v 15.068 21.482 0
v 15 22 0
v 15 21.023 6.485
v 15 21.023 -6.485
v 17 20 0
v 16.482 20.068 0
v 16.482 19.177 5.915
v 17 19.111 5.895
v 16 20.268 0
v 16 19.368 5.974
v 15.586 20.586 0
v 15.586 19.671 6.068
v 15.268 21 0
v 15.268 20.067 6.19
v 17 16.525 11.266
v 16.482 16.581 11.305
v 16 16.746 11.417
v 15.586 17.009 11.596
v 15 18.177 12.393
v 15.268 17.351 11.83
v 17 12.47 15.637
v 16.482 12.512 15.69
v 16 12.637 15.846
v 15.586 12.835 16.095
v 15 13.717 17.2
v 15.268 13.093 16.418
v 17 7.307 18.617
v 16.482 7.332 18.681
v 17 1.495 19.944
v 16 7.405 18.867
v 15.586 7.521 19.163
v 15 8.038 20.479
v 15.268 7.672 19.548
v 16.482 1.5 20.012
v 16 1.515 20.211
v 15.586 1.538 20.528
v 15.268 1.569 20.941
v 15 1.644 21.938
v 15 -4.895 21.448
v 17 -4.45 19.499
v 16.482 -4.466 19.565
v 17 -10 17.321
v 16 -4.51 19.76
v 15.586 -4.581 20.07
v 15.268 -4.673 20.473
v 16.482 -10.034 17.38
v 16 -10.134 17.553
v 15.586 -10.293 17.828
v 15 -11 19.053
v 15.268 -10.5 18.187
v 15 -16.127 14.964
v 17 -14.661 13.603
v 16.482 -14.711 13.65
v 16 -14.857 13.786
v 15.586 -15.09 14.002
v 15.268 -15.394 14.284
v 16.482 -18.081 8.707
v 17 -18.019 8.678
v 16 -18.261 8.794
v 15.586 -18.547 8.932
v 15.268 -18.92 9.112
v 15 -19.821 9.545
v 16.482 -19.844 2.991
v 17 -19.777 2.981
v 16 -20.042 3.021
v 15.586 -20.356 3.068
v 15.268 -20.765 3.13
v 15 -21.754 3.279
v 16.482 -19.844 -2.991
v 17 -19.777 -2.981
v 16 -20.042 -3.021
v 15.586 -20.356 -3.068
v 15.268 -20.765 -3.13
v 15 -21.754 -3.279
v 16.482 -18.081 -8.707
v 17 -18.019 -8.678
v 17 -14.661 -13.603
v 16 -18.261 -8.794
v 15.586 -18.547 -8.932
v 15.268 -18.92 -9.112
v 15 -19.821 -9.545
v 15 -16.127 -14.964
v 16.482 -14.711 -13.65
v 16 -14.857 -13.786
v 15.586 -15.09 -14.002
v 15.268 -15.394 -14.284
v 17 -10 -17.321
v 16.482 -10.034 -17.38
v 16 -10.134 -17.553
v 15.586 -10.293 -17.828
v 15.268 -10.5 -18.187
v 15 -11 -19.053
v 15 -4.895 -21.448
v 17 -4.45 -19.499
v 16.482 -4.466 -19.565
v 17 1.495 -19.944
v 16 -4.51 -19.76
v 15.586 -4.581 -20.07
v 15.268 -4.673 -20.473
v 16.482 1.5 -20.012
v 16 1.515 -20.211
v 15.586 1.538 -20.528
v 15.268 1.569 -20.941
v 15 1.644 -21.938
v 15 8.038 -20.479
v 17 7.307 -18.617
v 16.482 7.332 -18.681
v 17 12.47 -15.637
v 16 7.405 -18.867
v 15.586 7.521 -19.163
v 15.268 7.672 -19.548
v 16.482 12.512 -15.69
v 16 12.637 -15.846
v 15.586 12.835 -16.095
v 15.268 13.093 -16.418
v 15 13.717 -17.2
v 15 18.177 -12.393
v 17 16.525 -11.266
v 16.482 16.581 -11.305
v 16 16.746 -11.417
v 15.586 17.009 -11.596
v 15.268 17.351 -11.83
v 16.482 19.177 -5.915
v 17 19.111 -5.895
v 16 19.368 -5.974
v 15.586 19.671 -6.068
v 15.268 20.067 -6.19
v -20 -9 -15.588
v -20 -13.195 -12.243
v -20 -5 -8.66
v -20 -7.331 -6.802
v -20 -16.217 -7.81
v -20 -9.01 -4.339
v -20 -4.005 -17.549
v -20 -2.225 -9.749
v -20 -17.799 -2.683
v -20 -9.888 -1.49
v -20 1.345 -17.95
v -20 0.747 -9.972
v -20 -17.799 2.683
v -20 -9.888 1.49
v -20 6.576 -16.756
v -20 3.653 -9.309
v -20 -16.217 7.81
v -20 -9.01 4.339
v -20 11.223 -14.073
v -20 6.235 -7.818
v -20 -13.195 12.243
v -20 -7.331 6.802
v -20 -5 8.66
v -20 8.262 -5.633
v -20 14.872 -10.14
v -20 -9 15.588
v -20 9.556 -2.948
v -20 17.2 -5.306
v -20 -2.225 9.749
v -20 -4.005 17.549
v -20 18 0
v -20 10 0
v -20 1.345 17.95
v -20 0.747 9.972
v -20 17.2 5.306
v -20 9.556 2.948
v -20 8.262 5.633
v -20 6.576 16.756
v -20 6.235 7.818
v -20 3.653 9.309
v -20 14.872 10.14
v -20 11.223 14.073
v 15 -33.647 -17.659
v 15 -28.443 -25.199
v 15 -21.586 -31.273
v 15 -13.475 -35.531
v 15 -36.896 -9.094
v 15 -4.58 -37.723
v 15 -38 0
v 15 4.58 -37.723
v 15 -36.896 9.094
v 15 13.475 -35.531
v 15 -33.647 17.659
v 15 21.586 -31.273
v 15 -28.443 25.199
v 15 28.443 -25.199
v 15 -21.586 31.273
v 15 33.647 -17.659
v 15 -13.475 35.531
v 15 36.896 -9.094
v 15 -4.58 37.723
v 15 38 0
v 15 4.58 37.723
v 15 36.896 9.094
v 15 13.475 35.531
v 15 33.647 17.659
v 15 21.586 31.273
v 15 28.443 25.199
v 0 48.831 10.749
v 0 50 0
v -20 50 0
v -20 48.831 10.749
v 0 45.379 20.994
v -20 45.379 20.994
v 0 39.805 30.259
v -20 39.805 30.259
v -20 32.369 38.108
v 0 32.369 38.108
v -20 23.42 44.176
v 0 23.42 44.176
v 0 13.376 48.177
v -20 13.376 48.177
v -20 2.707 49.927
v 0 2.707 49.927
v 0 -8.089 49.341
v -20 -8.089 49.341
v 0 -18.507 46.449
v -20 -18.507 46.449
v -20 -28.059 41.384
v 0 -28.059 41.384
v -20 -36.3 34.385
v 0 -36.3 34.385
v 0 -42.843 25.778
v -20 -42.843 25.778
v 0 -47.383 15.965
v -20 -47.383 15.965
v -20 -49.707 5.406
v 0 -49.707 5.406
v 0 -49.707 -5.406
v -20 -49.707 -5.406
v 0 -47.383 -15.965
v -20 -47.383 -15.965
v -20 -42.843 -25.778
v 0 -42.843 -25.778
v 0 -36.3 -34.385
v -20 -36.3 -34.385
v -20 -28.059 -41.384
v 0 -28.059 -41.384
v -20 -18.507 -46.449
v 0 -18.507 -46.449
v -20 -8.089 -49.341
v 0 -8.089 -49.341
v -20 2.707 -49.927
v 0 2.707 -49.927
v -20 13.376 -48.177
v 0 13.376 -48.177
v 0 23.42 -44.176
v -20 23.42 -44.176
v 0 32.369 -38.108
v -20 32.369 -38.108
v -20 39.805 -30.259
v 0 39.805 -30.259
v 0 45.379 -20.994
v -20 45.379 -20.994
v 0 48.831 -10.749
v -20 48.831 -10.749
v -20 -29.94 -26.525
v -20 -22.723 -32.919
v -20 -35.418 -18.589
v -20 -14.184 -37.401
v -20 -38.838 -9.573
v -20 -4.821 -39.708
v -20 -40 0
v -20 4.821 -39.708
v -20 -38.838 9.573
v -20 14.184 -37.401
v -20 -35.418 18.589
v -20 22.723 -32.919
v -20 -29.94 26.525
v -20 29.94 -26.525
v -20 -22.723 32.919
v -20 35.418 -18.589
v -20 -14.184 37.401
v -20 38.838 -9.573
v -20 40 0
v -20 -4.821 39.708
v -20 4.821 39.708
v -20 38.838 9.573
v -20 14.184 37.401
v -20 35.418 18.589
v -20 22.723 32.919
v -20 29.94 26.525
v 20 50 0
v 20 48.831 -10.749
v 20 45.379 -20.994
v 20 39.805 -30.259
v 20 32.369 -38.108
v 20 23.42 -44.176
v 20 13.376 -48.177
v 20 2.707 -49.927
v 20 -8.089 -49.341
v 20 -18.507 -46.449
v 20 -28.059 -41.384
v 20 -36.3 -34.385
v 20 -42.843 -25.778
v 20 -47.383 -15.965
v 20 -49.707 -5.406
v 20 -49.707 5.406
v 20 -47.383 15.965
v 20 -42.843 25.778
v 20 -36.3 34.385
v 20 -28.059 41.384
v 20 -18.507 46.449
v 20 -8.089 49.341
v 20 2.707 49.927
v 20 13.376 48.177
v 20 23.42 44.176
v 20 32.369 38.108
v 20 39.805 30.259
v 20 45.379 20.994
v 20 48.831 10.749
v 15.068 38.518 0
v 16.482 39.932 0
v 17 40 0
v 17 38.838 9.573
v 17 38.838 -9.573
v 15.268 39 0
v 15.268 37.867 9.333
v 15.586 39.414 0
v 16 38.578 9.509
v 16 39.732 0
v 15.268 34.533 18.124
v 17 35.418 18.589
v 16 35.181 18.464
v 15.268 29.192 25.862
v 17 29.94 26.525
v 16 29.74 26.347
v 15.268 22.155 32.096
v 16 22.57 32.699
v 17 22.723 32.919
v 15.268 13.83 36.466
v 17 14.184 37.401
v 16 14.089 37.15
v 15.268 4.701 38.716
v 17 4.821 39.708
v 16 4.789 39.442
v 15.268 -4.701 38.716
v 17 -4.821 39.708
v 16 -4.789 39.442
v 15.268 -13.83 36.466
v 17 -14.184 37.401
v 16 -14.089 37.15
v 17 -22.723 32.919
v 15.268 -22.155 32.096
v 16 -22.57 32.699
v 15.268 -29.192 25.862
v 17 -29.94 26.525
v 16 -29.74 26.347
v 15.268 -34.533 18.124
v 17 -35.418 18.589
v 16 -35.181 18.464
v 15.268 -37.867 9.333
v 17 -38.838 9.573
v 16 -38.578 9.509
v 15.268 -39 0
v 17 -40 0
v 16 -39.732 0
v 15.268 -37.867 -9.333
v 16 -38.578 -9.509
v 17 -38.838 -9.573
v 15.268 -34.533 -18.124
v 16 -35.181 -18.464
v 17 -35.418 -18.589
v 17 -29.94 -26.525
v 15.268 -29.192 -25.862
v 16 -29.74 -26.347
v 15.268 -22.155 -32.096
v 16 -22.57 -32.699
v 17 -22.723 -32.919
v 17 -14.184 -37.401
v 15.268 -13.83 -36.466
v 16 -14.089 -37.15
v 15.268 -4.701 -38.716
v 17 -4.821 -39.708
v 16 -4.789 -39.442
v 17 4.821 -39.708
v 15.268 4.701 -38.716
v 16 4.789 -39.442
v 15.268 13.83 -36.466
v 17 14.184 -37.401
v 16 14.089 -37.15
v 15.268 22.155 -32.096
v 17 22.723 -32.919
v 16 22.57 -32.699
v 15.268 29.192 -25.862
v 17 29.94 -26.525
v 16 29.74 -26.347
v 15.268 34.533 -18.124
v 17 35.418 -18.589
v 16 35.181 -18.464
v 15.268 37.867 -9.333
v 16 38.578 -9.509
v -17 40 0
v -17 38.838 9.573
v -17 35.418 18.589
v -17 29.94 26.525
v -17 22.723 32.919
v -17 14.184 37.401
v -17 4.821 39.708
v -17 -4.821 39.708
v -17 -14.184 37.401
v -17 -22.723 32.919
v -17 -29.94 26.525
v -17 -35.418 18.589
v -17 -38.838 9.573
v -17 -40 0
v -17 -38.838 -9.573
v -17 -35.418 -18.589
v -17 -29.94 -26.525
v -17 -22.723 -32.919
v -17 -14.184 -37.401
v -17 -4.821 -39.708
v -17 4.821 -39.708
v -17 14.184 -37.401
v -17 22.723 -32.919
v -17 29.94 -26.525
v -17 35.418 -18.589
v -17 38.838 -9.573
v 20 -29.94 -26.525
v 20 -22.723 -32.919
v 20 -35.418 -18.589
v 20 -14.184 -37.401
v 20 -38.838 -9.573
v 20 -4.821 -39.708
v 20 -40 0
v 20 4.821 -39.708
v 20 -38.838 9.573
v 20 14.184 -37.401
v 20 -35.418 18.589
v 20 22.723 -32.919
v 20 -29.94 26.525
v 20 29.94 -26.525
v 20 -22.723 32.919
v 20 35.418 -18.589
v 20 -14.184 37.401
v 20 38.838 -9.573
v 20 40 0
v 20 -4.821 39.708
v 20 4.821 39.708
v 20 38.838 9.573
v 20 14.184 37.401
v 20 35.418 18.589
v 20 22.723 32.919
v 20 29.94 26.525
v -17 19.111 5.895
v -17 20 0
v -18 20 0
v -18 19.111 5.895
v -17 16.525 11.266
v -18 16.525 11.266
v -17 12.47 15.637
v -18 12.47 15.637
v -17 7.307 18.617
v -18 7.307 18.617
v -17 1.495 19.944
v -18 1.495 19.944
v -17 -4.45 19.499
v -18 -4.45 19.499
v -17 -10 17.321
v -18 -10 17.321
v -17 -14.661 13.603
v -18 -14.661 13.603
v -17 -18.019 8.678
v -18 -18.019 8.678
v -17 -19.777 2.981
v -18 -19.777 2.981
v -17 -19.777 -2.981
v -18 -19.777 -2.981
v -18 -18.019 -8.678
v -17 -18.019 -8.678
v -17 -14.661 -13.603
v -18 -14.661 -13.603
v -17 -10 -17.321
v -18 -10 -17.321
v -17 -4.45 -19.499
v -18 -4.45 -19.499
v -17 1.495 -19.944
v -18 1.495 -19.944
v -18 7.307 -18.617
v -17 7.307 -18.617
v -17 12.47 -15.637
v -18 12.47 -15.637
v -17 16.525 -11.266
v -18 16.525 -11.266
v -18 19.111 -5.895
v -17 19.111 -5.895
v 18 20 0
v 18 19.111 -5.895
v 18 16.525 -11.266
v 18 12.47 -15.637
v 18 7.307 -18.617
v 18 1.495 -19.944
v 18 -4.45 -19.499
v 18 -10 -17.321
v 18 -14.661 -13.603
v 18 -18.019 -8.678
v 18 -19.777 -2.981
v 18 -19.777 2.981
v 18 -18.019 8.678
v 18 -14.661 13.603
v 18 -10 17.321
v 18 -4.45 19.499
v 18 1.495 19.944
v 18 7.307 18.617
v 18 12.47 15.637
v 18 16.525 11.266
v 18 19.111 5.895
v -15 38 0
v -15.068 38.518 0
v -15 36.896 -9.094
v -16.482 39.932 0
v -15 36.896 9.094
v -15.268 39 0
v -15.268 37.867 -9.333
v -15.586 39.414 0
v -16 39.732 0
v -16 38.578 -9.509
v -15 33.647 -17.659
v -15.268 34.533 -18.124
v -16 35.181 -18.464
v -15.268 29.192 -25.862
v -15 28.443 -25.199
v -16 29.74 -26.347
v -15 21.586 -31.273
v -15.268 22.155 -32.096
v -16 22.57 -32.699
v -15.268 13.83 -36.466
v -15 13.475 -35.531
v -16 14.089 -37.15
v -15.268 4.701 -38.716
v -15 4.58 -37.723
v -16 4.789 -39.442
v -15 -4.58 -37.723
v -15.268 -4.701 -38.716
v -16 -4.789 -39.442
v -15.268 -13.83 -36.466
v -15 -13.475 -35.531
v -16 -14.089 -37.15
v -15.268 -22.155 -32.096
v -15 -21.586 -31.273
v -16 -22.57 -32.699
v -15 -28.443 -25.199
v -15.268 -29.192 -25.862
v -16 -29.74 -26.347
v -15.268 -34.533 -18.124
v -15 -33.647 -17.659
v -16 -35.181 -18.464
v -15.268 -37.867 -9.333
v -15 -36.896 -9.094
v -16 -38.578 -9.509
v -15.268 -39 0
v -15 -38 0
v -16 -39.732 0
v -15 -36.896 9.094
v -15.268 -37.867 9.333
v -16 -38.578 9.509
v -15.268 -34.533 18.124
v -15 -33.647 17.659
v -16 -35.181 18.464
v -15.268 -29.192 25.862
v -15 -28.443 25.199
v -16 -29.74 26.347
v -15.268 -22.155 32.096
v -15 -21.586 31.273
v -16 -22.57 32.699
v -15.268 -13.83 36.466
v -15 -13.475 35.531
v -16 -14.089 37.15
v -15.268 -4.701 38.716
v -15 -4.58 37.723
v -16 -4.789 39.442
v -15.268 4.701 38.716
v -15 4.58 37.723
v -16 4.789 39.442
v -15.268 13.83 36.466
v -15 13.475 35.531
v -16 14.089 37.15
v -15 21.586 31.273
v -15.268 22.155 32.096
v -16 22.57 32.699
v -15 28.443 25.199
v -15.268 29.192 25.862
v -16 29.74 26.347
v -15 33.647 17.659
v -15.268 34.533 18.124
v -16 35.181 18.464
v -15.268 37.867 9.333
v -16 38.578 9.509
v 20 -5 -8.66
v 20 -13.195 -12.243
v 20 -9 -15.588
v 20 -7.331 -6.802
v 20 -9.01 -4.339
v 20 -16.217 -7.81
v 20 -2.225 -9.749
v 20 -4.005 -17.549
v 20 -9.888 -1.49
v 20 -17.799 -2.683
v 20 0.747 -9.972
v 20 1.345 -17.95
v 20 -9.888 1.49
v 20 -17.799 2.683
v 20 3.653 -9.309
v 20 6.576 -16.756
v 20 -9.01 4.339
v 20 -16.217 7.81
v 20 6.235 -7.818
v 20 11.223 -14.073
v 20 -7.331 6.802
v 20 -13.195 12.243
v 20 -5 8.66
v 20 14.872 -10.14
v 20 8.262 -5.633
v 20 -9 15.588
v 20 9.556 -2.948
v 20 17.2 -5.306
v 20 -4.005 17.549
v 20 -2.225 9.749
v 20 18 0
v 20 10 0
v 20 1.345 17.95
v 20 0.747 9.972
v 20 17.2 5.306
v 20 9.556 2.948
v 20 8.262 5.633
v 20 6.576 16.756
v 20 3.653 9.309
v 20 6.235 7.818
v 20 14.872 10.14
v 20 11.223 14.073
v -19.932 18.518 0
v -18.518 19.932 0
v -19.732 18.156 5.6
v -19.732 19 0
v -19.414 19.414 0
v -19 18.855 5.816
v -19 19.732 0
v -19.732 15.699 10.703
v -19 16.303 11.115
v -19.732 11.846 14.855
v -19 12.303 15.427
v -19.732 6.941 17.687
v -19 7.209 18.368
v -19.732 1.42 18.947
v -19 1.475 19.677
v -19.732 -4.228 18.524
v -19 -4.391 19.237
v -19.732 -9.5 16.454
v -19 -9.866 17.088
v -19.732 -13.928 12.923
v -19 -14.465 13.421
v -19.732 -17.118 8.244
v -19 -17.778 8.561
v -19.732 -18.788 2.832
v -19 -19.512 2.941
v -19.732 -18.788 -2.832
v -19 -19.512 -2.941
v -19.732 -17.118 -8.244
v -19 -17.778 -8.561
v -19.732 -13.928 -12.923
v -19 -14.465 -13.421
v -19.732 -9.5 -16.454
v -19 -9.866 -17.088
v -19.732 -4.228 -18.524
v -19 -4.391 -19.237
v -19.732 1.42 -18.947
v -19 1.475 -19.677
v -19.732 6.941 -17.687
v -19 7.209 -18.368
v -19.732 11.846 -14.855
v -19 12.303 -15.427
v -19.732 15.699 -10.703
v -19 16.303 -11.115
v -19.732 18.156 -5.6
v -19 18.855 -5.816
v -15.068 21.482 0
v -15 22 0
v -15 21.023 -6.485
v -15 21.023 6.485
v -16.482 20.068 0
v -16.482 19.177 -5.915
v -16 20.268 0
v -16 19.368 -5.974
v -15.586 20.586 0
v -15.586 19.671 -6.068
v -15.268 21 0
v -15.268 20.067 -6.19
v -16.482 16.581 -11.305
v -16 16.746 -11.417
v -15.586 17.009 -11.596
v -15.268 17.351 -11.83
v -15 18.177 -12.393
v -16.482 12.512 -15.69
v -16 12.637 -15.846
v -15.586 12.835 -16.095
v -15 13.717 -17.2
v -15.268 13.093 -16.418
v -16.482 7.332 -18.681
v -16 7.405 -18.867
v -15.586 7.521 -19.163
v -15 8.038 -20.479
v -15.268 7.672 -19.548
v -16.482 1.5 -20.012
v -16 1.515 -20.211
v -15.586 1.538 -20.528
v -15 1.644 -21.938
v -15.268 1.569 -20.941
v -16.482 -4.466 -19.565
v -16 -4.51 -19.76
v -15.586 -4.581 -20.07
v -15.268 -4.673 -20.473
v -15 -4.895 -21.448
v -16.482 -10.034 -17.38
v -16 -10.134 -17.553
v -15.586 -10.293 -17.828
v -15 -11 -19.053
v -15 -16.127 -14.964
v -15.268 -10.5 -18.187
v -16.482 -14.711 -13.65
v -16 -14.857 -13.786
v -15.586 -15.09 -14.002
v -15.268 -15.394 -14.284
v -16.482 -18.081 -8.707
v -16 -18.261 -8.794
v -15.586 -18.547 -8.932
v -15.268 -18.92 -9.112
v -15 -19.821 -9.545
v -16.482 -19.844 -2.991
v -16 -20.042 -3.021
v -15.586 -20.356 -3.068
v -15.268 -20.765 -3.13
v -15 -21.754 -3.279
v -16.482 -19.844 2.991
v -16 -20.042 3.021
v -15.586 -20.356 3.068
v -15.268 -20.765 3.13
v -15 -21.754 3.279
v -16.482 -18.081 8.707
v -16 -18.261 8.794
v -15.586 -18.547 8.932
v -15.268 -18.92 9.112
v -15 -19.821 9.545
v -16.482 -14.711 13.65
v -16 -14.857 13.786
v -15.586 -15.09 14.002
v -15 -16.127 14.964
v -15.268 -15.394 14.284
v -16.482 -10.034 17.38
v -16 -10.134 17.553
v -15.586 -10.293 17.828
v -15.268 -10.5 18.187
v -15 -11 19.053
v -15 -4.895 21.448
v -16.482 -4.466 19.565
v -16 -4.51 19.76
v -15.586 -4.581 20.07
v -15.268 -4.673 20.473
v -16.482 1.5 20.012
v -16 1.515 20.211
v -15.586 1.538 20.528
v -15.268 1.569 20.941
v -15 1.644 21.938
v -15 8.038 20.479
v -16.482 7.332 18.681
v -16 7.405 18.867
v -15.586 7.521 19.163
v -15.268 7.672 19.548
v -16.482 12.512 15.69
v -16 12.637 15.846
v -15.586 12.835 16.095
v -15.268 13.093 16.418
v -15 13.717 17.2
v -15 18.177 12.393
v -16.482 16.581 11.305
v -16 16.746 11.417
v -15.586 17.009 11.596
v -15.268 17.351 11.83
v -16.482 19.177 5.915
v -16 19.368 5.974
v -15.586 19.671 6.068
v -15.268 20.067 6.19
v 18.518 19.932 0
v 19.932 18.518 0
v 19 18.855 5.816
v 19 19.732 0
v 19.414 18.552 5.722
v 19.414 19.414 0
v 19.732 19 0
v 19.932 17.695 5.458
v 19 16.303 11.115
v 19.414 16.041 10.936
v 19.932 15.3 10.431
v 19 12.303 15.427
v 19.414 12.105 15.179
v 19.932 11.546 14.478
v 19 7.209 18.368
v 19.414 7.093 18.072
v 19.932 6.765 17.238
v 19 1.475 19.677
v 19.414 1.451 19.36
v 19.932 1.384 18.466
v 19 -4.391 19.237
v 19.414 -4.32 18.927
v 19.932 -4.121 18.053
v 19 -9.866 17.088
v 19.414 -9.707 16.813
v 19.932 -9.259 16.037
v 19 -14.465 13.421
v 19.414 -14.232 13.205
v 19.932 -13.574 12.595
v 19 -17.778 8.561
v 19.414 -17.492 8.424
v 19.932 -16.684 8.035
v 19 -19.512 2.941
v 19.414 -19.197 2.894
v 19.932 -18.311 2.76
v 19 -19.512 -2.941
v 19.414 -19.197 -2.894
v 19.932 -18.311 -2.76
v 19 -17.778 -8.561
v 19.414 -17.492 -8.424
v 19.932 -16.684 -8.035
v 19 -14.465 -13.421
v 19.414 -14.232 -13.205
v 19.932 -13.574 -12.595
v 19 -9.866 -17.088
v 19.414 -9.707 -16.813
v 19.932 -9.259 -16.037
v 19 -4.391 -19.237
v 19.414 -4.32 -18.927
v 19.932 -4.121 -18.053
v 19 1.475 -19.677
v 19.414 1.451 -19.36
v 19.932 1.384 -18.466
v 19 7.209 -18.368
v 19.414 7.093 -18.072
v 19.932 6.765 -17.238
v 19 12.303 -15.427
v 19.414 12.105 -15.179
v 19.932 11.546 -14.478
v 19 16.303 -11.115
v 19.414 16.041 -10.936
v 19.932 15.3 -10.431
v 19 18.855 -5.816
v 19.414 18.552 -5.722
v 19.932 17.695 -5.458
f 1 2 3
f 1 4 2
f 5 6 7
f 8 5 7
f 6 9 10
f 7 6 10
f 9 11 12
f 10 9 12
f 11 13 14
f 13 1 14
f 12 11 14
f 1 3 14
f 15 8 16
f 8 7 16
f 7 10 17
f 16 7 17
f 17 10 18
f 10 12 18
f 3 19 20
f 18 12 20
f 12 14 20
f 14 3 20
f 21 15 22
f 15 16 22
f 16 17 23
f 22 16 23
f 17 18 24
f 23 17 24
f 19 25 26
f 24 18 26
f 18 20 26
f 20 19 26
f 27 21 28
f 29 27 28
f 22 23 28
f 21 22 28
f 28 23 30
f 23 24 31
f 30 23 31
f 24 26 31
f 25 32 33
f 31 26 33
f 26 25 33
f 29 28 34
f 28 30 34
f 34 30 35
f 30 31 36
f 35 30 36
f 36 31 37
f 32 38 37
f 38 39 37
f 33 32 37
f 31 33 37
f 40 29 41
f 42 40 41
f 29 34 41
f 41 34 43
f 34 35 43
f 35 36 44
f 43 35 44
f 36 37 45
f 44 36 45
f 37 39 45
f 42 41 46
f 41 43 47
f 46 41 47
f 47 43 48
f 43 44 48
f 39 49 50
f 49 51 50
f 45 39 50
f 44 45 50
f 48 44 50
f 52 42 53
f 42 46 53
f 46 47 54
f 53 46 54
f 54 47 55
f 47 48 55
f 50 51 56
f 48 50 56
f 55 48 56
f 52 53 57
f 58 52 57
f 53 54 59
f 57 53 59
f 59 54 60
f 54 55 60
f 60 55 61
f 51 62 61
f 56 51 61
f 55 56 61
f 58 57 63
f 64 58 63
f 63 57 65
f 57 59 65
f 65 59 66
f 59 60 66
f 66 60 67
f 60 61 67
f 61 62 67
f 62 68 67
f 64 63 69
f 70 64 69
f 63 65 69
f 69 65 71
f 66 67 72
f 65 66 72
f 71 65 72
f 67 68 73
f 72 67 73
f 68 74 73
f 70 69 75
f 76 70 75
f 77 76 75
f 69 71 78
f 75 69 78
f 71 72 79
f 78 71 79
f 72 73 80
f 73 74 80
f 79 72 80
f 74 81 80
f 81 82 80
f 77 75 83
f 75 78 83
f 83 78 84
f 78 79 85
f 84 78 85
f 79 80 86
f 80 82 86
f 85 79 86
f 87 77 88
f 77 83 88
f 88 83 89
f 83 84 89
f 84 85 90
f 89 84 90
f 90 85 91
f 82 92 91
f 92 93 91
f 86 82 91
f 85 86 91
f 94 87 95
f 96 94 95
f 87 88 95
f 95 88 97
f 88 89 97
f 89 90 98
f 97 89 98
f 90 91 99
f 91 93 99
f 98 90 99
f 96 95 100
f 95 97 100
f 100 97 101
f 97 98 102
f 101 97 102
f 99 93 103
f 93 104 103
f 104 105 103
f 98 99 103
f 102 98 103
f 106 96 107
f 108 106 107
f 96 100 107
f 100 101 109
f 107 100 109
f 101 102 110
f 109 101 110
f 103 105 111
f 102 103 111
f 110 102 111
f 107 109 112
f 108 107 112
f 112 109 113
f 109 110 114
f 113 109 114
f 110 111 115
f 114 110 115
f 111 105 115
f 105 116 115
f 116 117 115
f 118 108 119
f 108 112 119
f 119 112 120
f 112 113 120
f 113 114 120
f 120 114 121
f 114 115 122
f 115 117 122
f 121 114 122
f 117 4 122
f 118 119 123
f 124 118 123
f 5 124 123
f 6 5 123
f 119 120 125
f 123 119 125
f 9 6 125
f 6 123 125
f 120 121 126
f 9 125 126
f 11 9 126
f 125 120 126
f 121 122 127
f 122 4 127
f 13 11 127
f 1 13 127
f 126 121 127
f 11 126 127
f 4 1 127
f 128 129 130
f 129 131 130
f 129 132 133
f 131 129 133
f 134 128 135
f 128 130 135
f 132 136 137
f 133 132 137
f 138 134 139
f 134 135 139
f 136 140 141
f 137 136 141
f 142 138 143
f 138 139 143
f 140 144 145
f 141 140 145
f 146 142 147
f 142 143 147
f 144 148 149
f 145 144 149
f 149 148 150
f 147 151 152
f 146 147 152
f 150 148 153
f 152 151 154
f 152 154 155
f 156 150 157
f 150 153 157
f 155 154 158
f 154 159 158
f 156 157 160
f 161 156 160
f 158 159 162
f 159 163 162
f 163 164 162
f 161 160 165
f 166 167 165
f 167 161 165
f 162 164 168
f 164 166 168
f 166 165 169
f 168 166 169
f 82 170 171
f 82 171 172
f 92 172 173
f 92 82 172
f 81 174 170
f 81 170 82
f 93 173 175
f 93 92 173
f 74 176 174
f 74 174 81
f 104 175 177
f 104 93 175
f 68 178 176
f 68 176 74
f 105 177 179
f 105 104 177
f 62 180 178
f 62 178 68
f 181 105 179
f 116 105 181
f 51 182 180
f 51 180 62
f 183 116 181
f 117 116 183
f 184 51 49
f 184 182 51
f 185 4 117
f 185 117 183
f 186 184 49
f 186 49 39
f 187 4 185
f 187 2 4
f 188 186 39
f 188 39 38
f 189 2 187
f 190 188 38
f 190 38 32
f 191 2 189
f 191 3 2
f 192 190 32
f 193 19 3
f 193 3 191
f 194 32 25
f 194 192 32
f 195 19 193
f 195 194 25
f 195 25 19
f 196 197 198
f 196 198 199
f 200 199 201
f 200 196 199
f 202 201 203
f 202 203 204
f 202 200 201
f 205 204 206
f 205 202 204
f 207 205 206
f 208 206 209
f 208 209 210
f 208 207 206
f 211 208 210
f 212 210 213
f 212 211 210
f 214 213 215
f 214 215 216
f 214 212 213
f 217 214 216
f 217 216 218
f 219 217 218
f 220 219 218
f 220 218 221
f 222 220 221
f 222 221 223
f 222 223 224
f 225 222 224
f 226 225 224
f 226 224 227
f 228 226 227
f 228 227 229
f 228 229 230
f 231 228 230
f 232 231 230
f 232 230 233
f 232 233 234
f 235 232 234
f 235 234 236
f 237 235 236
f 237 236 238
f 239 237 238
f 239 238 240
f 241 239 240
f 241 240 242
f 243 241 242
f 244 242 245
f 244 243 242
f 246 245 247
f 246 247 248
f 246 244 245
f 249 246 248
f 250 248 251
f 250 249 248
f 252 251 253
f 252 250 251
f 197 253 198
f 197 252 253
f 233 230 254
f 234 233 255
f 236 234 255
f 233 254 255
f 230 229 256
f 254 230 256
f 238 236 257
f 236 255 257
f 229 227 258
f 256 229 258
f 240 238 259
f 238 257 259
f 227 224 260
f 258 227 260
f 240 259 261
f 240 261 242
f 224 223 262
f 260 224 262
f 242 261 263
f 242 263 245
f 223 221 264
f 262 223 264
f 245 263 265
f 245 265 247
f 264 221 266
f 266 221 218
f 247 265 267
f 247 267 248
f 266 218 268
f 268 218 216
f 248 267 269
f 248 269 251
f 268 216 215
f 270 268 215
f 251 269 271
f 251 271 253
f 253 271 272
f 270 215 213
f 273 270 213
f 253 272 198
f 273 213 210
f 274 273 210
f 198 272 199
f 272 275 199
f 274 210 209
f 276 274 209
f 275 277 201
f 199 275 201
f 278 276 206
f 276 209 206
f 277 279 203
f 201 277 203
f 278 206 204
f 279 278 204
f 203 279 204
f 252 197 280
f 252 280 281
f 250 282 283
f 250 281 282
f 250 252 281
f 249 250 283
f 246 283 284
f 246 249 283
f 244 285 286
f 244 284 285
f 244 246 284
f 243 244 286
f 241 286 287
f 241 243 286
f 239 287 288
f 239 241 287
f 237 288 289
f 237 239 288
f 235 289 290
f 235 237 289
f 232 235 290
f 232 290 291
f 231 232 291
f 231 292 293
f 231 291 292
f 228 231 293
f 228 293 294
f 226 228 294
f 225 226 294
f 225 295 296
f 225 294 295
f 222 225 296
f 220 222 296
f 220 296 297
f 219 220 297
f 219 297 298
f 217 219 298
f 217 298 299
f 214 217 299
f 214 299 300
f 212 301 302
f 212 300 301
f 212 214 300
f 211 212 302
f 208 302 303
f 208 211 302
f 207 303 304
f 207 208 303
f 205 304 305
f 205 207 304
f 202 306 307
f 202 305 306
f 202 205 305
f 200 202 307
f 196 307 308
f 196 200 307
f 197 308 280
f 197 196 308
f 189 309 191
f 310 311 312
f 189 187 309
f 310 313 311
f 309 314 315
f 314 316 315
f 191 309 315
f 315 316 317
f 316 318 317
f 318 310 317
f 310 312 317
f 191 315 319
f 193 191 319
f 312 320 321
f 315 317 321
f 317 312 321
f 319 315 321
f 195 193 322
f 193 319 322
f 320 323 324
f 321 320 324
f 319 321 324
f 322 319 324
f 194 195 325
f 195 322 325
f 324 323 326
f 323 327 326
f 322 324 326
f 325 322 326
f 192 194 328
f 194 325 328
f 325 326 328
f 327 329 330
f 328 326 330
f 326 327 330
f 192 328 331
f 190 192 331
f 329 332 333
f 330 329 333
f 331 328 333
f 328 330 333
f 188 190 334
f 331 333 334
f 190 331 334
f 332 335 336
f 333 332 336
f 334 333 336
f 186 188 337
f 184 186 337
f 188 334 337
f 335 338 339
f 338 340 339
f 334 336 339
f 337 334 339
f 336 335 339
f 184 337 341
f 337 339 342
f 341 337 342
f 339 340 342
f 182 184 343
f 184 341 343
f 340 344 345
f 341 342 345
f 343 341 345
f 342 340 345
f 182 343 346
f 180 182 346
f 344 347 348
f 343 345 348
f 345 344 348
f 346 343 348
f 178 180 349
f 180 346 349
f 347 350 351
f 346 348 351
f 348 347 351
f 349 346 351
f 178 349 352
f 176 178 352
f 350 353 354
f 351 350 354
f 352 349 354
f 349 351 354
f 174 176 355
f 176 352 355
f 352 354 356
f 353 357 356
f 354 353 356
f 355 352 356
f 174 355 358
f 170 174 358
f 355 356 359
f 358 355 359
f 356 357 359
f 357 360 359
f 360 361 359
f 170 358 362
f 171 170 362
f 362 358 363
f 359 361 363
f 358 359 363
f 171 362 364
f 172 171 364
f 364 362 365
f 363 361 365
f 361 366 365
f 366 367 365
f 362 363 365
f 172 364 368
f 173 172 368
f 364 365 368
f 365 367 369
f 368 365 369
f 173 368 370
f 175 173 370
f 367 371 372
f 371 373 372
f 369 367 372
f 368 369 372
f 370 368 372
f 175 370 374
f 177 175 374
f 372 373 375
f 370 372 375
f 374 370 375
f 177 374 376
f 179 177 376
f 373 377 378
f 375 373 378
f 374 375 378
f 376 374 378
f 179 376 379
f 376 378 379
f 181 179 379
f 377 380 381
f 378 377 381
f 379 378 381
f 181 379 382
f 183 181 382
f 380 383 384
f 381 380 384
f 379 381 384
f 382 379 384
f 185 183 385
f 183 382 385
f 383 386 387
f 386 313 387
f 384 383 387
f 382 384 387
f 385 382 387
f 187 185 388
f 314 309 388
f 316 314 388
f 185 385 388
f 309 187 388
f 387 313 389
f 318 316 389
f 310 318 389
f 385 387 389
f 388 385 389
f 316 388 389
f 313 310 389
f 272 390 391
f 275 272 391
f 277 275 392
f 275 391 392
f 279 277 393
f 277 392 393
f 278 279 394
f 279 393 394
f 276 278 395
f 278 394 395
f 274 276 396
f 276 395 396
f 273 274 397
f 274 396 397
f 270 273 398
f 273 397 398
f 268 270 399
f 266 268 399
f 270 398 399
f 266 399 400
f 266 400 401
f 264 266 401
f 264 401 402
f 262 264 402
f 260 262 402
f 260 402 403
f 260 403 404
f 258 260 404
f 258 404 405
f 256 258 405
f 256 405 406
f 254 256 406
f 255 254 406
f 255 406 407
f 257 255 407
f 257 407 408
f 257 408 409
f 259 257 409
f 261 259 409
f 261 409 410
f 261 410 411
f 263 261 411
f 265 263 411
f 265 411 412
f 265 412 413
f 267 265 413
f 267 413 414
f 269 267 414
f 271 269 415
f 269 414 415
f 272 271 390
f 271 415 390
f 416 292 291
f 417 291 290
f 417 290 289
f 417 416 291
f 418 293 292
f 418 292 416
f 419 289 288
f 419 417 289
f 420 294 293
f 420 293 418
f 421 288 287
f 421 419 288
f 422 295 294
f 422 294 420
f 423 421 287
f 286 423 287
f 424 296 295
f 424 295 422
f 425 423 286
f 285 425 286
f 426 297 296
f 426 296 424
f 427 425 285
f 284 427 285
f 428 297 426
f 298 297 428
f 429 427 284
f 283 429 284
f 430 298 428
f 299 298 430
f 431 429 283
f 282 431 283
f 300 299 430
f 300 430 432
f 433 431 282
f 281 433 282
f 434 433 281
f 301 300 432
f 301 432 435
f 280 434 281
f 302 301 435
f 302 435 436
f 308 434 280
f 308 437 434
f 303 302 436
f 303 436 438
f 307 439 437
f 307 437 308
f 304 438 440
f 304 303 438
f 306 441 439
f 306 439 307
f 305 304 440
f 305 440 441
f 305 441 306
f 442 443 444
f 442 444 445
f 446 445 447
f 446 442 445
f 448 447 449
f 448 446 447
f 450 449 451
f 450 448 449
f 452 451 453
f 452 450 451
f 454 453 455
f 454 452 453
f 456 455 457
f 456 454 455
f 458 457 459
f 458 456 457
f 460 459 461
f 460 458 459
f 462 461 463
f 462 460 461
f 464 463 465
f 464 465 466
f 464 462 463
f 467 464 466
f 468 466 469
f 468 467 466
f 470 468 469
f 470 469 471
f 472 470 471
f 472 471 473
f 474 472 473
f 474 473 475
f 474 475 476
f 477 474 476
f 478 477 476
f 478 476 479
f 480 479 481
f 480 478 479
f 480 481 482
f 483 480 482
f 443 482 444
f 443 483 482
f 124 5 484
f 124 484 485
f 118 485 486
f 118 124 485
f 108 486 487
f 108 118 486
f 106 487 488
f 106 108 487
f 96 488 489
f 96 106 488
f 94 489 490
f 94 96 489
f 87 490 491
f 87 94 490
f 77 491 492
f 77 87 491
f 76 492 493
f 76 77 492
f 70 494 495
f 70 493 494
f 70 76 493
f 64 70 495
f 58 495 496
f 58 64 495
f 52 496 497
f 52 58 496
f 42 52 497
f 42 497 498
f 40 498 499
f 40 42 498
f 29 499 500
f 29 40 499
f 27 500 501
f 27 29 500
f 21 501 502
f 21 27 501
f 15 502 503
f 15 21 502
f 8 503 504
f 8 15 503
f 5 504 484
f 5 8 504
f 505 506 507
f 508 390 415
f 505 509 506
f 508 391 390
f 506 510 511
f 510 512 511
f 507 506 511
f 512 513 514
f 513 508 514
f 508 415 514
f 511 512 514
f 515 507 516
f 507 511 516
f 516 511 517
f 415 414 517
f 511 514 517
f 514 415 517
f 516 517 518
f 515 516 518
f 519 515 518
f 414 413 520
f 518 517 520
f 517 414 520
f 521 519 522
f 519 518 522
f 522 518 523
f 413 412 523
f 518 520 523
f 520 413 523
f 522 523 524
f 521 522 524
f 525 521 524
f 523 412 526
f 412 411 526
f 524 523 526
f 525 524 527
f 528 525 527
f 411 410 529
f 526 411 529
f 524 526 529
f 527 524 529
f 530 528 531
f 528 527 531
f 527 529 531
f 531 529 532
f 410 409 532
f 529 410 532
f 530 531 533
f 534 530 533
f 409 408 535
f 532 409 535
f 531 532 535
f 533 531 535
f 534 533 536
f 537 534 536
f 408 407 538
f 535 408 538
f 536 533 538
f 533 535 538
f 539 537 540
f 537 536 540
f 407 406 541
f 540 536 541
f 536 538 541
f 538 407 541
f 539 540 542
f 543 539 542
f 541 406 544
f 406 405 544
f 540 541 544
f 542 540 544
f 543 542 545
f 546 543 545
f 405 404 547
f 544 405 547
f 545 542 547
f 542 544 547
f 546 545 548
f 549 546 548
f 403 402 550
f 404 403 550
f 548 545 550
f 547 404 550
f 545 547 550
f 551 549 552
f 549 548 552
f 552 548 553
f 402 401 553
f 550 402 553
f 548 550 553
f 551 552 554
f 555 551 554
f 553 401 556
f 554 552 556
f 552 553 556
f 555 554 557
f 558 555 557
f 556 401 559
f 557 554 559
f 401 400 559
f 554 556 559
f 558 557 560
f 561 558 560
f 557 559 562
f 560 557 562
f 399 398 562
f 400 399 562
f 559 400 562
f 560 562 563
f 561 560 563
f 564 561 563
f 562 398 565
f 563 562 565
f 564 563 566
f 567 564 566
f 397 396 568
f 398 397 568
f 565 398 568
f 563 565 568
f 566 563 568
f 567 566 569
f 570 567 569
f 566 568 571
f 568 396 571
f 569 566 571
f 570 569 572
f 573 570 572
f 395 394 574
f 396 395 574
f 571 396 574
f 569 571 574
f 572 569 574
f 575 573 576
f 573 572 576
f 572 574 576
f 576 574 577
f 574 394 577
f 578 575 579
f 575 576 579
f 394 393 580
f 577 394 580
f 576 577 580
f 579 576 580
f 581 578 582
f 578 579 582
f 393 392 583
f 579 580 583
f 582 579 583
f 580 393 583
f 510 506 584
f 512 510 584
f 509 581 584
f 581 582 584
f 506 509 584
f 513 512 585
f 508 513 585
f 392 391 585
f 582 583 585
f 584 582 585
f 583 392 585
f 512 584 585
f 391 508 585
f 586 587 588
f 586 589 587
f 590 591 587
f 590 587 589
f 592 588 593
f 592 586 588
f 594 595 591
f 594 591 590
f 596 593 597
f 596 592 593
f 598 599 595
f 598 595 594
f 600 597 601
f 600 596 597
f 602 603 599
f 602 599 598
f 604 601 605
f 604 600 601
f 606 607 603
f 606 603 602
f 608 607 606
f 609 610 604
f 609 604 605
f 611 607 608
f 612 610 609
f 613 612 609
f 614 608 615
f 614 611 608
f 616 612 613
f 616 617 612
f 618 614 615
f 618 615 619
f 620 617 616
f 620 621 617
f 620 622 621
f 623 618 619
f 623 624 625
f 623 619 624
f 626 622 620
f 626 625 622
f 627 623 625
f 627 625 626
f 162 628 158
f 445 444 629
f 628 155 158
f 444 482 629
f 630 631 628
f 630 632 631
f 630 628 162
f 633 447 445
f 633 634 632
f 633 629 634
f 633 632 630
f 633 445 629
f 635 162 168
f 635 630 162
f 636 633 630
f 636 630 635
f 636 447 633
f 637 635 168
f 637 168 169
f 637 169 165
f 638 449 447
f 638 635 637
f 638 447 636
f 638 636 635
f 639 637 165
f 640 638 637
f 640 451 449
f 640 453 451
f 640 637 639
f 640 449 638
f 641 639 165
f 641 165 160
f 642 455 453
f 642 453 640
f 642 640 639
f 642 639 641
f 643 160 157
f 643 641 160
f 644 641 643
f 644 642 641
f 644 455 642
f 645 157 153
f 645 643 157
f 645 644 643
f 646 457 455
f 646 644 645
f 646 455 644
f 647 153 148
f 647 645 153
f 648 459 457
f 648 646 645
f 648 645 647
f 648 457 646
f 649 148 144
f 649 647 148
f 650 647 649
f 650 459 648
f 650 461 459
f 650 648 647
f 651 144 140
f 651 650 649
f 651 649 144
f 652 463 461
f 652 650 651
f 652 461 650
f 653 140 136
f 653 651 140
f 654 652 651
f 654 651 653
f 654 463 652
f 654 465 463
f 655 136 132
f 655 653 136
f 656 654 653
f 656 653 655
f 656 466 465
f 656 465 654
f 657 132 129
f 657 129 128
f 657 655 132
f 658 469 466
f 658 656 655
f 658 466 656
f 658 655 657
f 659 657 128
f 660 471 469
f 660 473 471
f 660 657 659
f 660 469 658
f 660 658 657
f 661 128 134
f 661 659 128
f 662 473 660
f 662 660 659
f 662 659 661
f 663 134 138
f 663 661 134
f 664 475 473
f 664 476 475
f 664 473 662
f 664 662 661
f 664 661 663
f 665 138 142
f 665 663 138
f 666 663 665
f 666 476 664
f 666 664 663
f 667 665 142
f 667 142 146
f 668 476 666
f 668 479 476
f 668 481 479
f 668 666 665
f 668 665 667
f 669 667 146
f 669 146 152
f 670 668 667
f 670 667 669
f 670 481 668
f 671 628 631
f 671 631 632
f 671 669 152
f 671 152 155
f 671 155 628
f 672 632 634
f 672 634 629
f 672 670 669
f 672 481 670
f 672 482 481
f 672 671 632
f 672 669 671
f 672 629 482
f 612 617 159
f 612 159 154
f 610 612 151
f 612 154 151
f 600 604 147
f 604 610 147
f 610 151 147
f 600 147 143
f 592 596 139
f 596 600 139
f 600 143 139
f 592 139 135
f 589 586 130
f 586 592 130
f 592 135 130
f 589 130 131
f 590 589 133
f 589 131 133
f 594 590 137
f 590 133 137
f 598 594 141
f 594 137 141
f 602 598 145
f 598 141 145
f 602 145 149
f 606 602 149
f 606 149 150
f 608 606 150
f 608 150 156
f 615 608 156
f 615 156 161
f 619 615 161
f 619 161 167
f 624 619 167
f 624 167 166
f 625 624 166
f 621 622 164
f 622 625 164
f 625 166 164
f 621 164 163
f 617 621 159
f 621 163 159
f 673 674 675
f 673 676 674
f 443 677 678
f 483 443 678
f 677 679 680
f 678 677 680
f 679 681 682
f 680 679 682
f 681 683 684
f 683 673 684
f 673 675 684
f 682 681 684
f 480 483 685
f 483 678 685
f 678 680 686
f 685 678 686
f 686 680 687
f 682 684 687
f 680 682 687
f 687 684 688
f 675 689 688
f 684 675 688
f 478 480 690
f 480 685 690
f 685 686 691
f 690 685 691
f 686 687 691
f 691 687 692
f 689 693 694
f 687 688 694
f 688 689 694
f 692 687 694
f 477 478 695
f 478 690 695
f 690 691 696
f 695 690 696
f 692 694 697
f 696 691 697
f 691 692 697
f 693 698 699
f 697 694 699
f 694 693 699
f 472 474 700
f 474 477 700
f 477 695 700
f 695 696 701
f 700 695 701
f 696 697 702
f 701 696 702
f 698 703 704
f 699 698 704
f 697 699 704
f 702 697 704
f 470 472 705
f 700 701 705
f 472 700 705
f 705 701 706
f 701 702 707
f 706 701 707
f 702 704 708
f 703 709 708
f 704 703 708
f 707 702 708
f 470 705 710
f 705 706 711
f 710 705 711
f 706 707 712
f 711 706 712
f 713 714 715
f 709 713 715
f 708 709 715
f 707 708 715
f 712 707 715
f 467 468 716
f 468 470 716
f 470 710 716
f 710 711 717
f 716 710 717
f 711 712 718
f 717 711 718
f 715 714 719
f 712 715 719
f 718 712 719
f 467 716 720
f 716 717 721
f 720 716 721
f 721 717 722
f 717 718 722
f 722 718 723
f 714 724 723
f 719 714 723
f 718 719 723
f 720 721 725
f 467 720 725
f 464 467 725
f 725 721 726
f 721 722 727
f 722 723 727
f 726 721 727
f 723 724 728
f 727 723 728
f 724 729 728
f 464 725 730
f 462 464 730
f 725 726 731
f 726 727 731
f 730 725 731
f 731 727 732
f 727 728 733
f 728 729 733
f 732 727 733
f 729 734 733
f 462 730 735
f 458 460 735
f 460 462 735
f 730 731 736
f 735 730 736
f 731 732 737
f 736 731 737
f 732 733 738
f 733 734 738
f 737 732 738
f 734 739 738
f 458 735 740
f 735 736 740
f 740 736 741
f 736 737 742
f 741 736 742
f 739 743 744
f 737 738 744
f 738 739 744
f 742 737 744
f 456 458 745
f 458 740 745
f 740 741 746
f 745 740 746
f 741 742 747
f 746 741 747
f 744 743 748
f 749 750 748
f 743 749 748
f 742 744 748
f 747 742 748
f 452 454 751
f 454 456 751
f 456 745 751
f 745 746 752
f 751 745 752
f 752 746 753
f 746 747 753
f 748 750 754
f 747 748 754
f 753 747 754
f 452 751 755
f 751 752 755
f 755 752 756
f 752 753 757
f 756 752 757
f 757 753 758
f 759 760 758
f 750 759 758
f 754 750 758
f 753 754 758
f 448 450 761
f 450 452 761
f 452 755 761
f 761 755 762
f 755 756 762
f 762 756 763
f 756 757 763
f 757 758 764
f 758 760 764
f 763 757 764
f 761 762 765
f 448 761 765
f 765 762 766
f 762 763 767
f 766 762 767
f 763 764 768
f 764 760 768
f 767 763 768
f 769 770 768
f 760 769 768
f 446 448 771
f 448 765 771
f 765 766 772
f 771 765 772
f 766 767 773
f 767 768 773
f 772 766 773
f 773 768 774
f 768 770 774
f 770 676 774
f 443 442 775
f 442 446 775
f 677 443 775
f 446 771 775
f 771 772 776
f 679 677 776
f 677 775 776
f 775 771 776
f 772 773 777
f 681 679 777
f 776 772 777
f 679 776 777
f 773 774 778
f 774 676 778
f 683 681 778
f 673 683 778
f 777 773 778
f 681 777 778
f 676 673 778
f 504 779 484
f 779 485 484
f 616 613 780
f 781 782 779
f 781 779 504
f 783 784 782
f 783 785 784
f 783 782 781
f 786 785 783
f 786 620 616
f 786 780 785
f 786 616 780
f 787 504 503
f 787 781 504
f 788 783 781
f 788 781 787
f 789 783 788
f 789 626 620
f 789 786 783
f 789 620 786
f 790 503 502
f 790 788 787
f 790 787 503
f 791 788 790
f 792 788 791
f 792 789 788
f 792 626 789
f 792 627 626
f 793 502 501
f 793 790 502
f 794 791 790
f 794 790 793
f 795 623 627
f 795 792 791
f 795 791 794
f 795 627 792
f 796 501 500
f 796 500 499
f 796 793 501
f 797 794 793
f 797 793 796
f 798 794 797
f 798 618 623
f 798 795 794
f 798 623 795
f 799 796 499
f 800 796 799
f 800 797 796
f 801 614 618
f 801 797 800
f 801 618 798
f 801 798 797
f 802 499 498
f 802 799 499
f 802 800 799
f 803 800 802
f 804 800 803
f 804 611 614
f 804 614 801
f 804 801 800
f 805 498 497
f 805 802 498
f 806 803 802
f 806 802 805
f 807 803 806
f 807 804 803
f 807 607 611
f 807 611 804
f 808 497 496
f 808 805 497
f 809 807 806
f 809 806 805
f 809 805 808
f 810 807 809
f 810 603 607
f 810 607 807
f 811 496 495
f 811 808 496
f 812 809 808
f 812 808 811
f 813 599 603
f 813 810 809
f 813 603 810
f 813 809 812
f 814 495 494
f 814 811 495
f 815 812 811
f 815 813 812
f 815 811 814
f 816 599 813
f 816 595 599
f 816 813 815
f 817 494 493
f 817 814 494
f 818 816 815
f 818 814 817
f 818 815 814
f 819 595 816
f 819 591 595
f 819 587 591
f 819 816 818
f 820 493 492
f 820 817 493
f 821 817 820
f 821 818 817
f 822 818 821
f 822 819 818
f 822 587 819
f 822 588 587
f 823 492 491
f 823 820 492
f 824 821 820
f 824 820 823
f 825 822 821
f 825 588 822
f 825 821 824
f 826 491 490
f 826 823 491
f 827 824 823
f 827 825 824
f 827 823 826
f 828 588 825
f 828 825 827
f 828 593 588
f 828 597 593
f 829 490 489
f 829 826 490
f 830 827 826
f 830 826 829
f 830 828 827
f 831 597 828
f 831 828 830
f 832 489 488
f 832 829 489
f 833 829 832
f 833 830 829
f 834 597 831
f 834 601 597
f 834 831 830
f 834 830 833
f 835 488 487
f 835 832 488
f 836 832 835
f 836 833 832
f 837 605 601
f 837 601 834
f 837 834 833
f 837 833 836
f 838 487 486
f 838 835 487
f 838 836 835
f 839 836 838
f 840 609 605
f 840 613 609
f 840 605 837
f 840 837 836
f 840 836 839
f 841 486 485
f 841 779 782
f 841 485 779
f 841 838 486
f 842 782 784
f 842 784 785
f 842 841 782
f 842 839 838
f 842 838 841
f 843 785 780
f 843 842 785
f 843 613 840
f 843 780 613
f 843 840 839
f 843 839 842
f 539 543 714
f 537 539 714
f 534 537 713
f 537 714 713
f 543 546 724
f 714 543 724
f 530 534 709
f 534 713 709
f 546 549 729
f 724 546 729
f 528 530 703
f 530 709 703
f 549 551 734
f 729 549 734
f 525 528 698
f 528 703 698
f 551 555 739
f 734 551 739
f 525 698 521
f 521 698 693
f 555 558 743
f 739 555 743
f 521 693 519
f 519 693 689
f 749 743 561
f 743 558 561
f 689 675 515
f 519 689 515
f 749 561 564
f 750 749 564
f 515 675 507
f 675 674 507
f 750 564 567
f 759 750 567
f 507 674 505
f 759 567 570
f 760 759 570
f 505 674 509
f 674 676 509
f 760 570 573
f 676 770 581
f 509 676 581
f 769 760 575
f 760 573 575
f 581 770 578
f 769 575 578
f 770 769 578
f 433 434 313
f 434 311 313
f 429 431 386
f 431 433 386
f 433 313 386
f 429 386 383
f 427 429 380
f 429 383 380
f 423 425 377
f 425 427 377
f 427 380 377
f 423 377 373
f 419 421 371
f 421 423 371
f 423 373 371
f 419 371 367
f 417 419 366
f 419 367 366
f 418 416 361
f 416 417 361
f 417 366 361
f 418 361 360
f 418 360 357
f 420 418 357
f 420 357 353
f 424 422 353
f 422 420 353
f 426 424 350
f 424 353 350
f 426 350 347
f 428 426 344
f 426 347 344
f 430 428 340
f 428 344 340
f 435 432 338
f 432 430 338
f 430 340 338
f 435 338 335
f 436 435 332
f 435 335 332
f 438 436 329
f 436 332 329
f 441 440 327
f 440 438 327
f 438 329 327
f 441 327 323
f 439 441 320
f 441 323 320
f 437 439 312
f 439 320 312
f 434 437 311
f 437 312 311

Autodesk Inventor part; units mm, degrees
ref_plane "YZ Plane" through (0, 0, 0) normal (1, 0, 0) x (0, 1, 0)
ref_plane "XZ Plane" through (0, 0, 0) normal (0, 1, 0) x (-1, 0, 0)
ref_plane "XY Plane" through (0, 0, 0) normal (0, 0, 1) x (1, 0, 0)
sketch "Sketch1" plane through (0, 0, 0) normal (1, 0, 0) x (0, 1, 0)
  circle A0 centre (0, 0) radius 10
  circle A1 centre (0, 0) radius 20
  circle A2 centre (0, 0) radius 40
  circle A3 centre (0, 0) radius 50
  dimension "d0" = 20
  dimension "d1" = 40
  dimension "d2" = 80
  dimension "d3" = 100
extrude "Extrusion1" add sketch "Sketch1" along normal mid plane 40
extrude "Extrusion3" add sketch "Sketch1" along normal mid plane 30 contours A2
fillet "Fillet1" radius 2 6 edges at (15, -40, 0) (-15, -40, 0) (20, -20, 0) (15, -20, 0) (-20, -20, 0) (-15, -20, 0)
